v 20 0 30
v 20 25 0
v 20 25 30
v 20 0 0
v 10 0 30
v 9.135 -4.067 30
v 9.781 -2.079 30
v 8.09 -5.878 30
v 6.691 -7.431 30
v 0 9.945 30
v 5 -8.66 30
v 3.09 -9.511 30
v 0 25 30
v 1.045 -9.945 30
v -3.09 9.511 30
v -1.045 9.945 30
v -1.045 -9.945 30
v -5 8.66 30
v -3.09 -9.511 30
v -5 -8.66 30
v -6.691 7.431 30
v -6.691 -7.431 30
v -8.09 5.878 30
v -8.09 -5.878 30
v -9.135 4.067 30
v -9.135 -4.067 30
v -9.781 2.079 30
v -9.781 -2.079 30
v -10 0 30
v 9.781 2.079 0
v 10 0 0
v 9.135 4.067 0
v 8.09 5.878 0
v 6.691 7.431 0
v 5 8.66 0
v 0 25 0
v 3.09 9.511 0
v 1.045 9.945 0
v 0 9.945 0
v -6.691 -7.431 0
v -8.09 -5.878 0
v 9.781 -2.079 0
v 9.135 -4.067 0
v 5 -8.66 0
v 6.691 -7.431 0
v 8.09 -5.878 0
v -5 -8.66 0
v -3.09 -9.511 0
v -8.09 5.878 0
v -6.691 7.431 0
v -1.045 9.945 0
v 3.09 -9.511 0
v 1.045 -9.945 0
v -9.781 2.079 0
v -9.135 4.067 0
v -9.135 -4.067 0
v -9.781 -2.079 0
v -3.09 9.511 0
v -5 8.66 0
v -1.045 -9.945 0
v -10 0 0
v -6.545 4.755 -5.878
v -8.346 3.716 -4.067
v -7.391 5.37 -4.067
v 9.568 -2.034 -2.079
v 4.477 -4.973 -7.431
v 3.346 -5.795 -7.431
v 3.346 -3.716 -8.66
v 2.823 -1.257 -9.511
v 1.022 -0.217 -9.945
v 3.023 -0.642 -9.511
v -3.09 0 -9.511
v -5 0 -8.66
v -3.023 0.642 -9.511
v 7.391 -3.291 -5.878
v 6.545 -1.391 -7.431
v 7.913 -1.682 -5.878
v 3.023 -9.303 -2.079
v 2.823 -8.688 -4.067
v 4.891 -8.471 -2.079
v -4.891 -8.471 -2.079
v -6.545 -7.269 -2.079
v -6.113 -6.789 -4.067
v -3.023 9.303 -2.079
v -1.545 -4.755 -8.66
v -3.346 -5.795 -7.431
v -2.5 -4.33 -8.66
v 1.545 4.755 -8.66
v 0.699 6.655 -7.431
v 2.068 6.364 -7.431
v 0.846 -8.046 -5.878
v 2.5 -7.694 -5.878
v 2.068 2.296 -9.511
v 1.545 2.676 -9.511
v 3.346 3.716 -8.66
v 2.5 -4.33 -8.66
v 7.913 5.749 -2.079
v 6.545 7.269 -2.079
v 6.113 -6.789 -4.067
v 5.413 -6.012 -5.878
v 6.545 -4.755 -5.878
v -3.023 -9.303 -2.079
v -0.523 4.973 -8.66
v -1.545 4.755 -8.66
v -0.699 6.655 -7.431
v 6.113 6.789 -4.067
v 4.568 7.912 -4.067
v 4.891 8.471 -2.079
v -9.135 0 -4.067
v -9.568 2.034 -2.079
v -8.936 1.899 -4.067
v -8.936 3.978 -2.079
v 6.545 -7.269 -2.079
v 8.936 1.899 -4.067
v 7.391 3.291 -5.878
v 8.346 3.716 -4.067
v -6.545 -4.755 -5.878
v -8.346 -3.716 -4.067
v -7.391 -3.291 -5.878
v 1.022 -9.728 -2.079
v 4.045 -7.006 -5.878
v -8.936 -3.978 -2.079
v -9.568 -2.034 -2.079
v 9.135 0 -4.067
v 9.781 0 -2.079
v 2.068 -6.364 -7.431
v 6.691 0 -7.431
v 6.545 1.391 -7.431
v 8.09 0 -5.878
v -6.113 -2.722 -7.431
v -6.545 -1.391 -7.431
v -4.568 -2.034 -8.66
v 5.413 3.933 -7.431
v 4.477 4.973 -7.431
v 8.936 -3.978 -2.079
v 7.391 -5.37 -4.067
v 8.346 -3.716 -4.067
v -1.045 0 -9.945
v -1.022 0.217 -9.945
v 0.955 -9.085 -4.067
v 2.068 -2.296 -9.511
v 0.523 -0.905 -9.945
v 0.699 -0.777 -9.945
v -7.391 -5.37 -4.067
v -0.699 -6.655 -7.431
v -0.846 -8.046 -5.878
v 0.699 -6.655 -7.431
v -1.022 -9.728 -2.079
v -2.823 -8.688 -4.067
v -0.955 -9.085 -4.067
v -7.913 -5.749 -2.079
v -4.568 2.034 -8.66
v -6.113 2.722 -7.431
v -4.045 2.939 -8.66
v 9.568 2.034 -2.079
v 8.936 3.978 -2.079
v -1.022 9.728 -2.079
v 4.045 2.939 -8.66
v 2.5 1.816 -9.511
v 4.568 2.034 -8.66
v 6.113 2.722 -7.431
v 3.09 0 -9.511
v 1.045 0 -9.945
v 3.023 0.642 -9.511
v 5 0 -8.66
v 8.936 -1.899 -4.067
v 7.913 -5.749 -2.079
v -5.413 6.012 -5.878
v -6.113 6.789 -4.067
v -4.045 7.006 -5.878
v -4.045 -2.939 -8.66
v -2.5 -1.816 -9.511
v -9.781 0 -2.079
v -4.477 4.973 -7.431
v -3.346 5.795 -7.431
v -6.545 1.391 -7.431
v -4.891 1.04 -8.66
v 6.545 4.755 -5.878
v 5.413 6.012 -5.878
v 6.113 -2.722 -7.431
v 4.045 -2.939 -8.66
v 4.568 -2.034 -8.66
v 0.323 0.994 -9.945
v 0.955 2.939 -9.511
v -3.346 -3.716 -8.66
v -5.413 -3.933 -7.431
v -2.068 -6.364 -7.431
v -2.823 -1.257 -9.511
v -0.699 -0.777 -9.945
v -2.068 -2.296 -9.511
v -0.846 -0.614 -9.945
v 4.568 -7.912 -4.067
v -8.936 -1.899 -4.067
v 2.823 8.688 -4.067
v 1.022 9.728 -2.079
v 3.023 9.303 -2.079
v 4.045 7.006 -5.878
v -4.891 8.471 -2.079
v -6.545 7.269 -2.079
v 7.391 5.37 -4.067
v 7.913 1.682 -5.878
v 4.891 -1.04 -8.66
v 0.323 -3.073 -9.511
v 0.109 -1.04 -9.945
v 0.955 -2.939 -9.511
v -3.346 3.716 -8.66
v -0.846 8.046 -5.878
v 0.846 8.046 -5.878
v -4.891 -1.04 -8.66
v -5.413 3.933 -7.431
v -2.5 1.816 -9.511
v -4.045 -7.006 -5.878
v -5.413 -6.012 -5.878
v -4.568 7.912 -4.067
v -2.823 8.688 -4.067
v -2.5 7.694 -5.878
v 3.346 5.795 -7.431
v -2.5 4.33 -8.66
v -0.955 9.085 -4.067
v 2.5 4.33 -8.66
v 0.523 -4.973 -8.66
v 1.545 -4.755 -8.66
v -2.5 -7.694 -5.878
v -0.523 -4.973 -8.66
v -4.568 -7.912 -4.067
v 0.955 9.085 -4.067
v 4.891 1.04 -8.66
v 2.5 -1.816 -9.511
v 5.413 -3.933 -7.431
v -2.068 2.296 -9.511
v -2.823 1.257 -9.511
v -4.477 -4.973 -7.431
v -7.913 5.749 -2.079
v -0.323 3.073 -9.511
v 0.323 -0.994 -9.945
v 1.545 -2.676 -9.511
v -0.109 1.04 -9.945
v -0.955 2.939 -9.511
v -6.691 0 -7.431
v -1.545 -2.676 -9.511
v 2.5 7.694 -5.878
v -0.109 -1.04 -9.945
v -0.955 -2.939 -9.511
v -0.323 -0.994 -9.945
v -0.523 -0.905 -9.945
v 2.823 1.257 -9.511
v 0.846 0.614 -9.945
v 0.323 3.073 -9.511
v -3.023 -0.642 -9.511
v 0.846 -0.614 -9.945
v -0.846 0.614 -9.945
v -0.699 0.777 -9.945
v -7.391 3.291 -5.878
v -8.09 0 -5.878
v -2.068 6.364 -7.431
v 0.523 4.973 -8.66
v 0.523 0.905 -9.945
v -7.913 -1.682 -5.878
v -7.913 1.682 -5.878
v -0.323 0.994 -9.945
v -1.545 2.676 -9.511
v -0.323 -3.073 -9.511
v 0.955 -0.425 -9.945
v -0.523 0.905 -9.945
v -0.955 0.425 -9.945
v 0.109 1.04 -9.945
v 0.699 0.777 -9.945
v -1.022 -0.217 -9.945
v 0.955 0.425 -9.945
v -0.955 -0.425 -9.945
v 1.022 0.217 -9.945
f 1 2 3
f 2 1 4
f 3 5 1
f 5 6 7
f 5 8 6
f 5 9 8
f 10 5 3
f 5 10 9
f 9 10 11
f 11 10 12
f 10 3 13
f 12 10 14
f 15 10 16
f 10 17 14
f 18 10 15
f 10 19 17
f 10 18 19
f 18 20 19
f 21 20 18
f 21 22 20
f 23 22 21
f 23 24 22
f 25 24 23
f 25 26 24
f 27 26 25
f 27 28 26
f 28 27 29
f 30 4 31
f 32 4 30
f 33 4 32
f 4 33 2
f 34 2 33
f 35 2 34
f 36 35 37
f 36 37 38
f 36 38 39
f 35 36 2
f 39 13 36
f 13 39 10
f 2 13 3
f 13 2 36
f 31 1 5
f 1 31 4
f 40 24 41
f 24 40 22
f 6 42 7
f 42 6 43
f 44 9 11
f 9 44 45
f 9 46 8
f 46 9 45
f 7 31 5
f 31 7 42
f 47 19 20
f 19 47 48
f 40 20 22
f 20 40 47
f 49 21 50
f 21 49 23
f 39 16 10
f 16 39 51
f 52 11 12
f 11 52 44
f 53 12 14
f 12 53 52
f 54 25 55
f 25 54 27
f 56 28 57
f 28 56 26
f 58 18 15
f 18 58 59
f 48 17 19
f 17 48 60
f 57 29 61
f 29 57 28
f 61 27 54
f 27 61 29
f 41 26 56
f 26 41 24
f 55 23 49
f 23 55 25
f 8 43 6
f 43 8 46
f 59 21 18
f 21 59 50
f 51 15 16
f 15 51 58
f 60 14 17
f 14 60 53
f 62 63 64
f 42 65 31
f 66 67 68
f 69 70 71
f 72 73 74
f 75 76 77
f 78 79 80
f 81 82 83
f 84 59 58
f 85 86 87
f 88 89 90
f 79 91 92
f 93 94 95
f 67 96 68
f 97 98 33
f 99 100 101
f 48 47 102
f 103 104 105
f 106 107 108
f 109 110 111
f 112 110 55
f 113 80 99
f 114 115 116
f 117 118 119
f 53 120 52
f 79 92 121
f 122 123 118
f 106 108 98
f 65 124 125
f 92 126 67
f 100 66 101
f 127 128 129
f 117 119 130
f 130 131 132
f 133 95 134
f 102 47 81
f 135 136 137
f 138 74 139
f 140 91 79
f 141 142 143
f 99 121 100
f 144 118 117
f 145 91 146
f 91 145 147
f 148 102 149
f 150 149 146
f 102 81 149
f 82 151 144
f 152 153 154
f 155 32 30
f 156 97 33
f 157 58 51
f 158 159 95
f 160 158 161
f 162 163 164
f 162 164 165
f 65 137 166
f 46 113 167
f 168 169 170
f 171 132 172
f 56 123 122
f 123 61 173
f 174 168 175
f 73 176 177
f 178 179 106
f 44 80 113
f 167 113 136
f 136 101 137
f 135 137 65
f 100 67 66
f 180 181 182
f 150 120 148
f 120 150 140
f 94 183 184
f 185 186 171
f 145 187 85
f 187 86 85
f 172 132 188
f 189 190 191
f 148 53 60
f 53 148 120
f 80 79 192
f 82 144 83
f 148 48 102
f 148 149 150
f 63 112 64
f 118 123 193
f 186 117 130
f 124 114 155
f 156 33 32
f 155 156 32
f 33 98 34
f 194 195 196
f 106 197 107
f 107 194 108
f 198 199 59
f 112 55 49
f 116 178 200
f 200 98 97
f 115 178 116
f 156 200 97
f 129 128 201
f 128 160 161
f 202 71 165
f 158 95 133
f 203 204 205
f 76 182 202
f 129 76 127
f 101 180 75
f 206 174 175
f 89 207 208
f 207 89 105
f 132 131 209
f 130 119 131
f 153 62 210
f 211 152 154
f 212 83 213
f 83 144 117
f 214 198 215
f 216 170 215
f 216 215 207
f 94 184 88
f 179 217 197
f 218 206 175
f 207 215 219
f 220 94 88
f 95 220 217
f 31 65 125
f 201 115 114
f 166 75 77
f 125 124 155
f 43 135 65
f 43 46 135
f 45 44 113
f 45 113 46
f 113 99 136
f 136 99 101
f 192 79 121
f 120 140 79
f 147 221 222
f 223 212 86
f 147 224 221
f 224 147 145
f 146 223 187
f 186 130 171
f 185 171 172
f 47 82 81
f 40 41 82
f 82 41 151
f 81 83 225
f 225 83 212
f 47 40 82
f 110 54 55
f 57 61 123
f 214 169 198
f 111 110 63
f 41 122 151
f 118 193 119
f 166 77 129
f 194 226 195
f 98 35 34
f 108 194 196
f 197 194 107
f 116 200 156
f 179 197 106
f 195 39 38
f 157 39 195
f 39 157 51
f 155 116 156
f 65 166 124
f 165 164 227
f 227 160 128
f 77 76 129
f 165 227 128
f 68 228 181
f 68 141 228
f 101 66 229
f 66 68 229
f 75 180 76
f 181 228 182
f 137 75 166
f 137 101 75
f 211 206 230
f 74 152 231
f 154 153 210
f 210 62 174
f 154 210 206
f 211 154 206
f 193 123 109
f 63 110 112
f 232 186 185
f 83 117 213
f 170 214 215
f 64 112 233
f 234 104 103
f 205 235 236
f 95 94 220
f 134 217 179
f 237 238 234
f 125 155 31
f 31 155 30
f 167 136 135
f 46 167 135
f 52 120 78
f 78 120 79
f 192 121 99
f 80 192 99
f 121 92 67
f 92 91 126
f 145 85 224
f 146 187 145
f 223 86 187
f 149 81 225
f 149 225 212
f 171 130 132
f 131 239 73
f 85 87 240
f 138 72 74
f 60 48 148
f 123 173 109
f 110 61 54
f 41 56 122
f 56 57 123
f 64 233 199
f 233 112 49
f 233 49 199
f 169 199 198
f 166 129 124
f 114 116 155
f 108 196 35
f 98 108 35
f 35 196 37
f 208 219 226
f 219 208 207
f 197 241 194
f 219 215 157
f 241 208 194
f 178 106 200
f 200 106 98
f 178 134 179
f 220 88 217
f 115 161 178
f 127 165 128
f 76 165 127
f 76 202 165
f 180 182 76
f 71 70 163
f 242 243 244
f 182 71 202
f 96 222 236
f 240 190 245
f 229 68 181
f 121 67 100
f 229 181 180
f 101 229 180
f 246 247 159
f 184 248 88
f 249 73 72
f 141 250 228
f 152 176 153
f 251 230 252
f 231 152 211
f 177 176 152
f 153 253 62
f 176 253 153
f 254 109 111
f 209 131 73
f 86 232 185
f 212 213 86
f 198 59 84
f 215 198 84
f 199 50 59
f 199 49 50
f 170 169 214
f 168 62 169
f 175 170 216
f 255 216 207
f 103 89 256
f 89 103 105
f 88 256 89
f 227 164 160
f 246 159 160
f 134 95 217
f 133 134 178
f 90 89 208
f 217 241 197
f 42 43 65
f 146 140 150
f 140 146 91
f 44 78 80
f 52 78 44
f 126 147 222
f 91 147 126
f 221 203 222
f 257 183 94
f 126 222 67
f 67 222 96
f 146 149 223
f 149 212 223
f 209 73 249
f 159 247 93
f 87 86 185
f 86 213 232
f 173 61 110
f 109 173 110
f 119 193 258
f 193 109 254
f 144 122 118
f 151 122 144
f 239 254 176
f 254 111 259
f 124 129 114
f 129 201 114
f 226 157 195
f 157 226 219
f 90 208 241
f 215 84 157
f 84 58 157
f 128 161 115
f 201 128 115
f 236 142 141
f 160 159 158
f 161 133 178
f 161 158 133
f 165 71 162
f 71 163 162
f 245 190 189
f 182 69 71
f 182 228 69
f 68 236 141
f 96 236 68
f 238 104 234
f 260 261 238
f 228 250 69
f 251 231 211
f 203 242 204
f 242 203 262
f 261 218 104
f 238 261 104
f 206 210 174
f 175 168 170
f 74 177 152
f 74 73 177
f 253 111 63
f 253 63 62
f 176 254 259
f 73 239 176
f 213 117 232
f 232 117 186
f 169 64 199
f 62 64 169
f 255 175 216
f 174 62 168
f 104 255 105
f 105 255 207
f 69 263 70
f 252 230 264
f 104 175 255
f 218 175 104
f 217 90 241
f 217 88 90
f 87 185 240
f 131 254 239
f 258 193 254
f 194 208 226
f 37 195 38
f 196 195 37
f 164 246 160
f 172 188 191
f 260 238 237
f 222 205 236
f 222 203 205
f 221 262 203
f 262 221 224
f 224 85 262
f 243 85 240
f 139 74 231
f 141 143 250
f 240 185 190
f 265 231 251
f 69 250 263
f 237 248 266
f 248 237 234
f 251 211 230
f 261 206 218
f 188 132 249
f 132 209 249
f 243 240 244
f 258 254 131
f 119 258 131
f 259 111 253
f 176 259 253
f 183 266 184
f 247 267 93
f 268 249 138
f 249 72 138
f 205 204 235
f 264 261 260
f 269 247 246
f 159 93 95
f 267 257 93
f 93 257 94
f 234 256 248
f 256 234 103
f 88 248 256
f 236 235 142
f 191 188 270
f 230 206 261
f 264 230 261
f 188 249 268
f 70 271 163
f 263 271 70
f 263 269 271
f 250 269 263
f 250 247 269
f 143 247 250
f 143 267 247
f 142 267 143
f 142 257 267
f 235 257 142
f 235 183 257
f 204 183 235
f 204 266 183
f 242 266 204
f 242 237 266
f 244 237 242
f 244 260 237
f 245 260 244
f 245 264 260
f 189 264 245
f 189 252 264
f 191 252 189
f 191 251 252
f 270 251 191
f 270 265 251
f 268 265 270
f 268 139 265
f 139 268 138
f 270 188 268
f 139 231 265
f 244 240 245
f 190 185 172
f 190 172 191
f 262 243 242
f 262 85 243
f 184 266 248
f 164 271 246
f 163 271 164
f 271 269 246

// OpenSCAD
// Failure class 7: magic numbers instead of parameters
// All dimensions are inlined as numeric literals. The user's stated
// dimensions should appear as named parameters, never as inline values.
cube([20, 25, 30]);
cylinder(h=30, d=20);
sphere(r=10);
